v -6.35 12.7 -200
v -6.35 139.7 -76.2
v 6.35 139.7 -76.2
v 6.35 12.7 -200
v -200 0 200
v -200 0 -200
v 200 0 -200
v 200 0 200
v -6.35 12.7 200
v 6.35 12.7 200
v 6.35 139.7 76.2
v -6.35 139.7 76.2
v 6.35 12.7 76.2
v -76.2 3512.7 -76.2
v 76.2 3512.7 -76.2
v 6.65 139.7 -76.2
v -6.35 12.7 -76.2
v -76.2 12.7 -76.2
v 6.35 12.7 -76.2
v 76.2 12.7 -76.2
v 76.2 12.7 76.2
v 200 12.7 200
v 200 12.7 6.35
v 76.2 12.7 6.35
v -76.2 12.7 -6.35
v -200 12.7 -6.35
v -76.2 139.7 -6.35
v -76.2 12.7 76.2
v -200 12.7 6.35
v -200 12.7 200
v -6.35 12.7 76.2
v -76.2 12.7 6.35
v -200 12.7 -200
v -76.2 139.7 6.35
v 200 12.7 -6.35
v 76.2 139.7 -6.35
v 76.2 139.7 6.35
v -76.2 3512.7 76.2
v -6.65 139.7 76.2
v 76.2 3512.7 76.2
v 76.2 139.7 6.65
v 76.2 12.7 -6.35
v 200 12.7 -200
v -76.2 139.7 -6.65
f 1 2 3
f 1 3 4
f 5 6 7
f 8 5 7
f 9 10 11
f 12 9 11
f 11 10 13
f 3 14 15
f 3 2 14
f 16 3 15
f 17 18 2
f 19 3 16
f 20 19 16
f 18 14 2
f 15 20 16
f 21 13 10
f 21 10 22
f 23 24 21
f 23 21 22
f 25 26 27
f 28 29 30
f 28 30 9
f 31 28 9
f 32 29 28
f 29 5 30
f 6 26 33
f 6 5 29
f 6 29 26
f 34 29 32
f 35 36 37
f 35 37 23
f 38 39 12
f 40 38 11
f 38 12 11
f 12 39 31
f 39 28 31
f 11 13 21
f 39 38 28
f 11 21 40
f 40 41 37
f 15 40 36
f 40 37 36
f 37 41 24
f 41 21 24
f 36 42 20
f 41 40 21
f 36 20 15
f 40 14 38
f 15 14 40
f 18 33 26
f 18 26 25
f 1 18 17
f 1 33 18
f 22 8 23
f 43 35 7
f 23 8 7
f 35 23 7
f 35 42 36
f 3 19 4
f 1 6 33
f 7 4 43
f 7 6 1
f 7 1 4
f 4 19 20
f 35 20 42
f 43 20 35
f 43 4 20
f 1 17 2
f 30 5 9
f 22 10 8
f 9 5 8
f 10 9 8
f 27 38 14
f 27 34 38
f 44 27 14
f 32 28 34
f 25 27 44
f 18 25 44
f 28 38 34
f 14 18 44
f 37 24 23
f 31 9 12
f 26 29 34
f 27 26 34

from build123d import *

# Parameters (mm, degrees)
CROQUIS1_W              = 400
CROQUIS1_H              = 400
SALIENTE_EXTRUIR1_DEPTH = 12.7
CROQUIS2_W              = 152.4
CROQUIS2_H              = 152.4
SALIENTE_EXTRUIR2_DEPTH = 3500
CROQUIS3_W              = 123.8
CROQUIS3_H              = 12.7
CROQUIS3_W_2            = 12.7
CROQUIS3_H_2            = 123.8
SALIENTE_EXTRUIR3_DEPTH = 127
CORTAR_EXTRUIR1_DEPTH   = 13
CORTAR_EXTRUIR2_DEPTH   = 13
CORTAR_EXTRUIR3_DEPTH   = 13
CORTAR_EXTRUIR4_DEPTH   = 13


with BuildPart() as part:
    # Croquis1 → Saliente-Extruir1 (new body)
    with BuildSketch(Plane(origin=(0, 0, 0), x_dir=(1, 0, 0), z_dir=(0, 1, 0))):
        Rectangle(CROQUIS1_W, CROQUIS1_H)
    extrude(amount=SALIENTE_EXTRUIR1_DEPTH)

    # Croquis2 → Saliente-Extruir2 (add)
    with BuildSketch(Plane(origin=(0, 12.7, 0), x_dir=(1, 0, 0), z_dir=(0, 1, 0))):
        Rectangle(CROQUIS2_W, CROQUIS2_H)
    extrude(amount=SALIENTE_EXTRUIR2_DEPTH)

    # Croquis3 → Saliente-Extruir3 (add)
    with BuildSketch(Plane(origin=(0, 12.7, 0), x_dir=(1, 0, 0), z_dir=(0, 1, 0))):
        with Locations((138.1, 0)):
            Rectangle(CROQUIS3_W, CROQUIS3_H)
        with Locations((-138.1, 0)):
            Rectangle(CROQUIS3_W, CROQUIS3_H)
        with Locations((0, 138.1)):
            Rectangle(CROQUIS3_W_2, CROQUIS3_H_2)
        with Locations((0, -138.1)):
            Rectangle(CROQUIS3_W_2, CROQUIS3_H_2)
    extrude(amount=SALIENTE_EXTRUIR3_DEPTH)

    # Croquis4 → Cortar-Extruir1 (cut)
    with BuildSketch(Plane(origin=(6.35, 0, 0), x_dir=(0, 0, -1), z_dir=(1, 0, 0))):
        Polygon((-200, 12.7), (-76.2, 139.7), (-200, 139.7), align=None)
    extrude(amount=-CORTAR_EXTRUIR1_DEPTH, mode=Mode.SUBTRACT)

    # Croquis5 → Cortar-Extruir2 (cut)
    with BuildSketch(Plane.XY.offset(6.35)):
        Polygon((-200, 12.7), (-76.2, 139.7), (-200, 139.7), align=None)
    extrude(amount=-CORTAR_EXTRUIR2_DEPTH, mode=Mode.SUBTRACT)

    # Croquis6 → Cortar-Extruir3 (cut)
    with BuildSketch(Plane.ZY.offset(6.35)):
        Polygon((-76.2, 139.7), (-200, 12.7), (-200, 139.7), align=None)
    extrude(amount=-CORTAR_EXTRUIR3_DEPTH, mode=Mode.SUBTRACT)

    # Croquis7 → Cortar-Extruir4 (cut)
    with BuildSketch(Plane(origin=(0, 0, -6.35), x_dir=(-1, 0, 0), z_dir=(0, 0, -1))):
        Polygon((-76.2, 139.7), (-200, 12.7), (-200, 139.7), align=None)
    extrude(amount=-CORTAR_EXTRUIR4_DEPTH, mode=Mode.SUBTRACT)


solid = part.part
